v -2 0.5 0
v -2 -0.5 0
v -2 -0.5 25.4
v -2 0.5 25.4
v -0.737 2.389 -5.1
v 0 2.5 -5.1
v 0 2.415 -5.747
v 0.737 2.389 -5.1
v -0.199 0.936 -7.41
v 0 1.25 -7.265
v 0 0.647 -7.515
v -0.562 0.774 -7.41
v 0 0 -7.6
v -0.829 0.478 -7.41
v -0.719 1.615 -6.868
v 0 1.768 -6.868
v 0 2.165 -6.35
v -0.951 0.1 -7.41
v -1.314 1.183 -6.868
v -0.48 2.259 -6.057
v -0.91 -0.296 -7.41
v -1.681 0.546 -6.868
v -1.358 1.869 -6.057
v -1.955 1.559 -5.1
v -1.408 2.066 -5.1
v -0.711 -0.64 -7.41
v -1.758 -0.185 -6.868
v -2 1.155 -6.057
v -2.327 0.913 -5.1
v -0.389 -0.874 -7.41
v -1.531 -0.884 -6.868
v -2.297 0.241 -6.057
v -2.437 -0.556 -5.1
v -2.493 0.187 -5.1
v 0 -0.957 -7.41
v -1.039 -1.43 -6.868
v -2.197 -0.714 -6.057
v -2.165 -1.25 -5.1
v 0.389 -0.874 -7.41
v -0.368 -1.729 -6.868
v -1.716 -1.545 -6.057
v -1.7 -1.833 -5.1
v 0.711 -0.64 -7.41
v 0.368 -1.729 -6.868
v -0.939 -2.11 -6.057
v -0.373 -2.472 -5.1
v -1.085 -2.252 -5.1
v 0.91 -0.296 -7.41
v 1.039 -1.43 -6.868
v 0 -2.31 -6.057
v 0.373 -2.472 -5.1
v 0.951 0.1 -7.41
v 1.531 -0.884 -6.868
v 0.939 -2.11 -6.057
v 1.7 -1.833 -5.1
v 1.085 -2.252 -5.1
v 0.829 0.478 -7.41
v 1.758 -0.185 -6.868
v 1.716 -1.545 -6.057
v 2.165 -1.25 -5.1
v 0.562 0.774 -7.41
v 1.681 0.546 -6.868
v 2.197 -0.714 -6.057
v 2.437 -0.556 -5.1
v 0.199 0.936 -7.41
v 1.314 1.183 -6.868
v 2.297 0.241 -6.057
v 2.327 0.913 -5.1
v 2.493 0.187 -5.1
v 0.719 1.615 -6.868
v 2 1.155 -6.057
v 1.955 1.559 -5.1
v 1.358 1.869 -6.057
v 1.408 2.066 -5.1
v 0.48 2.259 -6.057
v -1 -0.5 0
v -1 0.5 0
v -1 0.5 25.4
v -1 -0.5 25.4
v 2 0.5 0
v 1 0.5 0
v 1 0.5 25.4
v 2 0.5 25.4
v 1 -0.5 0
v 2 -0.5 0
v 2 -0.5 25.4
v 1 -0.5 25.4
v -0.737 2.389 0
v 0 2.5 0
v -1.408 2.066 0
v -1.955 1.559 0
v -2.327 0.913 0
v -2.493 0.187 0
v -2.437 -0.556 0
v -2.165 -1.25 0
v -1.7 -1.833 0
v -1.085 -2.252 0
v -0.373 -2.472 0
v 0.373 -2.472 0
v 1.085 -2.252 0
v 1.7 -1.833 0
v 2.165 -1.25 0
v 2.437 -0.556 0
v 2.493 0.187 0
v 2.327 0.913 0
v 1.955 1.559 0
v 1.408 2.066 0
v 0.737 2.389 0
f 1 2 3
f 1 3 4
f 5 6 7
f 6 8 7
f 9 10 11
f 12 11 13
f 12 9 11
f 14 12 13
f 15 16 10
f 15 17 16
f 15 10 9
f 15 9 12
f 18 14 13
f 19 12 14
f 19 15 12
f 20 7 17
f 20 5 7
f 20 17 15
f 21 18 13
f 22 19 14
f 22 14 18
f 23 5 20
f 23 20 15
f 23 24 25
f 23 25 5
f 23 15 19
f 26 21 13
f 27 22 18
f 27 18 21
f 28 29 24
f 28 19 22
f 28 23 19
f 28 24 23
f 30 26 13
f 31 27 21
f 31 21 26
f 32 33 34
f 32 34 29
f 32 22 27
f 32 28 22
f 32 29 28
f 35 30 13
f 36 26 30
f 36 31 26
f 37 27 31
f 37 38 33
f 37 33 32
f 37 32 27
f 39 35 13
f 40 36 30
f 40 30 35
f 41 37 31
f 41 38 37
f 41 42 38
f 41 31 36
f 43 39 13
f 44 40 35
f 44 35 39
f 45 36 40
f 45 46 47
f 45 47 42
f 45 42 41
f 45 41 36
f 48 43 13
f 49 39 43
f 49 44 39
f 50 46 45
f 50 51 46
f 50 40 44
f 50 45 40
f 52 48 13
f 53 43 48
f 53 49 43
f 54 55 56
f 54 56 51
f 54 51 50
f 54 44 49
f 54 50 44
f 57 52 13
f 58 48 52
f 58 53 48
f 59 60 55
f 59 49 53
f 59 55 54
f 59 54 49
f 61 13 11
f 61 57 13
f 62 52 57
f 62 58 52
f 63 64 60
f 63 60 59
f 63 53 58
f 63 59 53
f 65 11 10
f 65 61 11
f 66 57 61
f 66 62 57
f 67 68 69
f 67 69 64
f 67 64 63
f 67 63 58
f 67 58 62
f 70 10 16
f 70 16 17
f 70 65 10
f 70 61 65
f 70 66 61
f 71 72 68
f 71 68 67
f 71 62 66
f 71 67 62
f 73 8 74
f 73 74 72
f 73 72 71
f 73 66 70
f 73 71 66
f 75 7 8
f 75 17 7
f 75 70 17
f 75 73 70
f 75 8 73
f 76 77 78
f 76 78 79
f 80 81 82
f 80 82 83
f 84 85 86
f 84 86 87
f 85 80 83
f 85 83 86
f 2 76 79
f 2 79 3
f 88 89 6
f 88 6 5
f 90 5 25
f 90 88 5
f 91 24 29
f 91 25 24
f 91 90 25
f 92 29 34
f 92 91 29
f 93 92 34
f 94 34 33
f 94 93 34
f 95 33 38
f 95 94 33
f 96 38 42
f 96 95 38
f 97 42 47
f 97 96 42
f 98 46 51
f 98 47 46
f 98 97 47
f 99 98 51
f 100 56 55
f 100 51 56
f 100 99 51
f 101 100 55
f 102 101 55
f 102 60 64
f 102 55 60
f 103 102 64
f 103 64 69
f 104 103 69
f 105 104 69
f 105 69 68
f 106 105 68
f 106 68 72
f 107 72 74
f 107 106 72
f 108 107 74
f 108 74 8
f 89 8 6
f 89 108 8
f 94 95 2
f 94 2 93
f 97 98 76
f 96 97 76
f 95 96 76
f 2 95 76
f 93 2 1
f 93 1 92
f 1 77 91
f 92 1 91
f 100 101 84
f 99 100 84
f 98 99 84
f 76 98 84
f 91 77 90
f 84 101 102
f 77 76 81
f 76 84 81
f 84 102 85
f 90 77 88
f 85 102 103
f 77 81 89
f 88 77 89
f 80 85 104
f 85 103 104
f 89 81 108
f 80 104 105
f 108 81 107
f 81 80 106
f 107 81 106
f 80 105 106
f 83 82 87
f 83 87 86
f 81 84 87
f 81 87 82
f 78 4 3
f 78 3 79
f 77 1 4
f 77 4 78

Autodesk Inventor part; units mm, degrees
ref_plane "YZ Plane" through (0, 0, 0) normal (1, 0, 0) x (0, 1, 0)
ref_plane "XZ Plane" through (0, 0, 0) normal (0, 1, 0) x (-1, 0, 0)
ref_plane "XY Plane" through (0, 0, 0) normal (0, 0, 1) x (1, 0, 0)
sketch "Sketch1" plane through (0, 0, 0) normal (1, 0, 0) x (0, 1, 0)
  line L0 (2.5, 0) -> (-2.5, 0)
  line L1 (-2.5, 0) -> (-2.5, -5.1)
  line L2 (-2.5, -5.1) -> (2.5, -5.1)
  line L3 (2.5, -5.1) -> (2.5, 0)
  circle A0 centre (0, -5.1) radius 2.5
  line L4 (0, 0) -> (0, -7.6)
  dimension "d0" = 5
  dimension "d1" = 5.1
revolve "Revolution1" add sketch "Sketch1" angle 360 about axis through (0, 0, 0) along (0, 0, -1) picked at (1.6458, -5.2854) picked at (1.6458, -4.9146) contours L3 A0 L4 L0 | A0 L4 L2 | L2 L4 A0
sketch "Sketch2" plane through (0, 0, 0) normal (0, 0, 1) x (1, 0, 0)
  line L0 (-1, -0.5) -> (-2, -0.5)
  line L1 (-2, -0.5) -> (-2, 0.5)
  line L2 (-2, 0.5) -> (-1, 0.5)
  line L3 (-1, 0.5) -> (-1, -0.5)
  line L4 (2, -0.5) -> (1, -0.5)
  line L5 (1, -0.5) -> (1, 0.5)
  line L6 (1, 0.5) -> (2, 0.5)
  line L7 (2, 0.5) -> (2, -0.5)
  point P0 (0, 0)
  point P1 (1, 0)
  dimension "d3" = 1
  dimension "d4" = 1
  dimension "d5" = 1
  dimension "d6" = 2
  dimension "d7" = 1
extrude "Extrusion1" add sketch "Sketch2" along normal blind 25.4
properties part number "LED" material "PC/ABS Plastic"
